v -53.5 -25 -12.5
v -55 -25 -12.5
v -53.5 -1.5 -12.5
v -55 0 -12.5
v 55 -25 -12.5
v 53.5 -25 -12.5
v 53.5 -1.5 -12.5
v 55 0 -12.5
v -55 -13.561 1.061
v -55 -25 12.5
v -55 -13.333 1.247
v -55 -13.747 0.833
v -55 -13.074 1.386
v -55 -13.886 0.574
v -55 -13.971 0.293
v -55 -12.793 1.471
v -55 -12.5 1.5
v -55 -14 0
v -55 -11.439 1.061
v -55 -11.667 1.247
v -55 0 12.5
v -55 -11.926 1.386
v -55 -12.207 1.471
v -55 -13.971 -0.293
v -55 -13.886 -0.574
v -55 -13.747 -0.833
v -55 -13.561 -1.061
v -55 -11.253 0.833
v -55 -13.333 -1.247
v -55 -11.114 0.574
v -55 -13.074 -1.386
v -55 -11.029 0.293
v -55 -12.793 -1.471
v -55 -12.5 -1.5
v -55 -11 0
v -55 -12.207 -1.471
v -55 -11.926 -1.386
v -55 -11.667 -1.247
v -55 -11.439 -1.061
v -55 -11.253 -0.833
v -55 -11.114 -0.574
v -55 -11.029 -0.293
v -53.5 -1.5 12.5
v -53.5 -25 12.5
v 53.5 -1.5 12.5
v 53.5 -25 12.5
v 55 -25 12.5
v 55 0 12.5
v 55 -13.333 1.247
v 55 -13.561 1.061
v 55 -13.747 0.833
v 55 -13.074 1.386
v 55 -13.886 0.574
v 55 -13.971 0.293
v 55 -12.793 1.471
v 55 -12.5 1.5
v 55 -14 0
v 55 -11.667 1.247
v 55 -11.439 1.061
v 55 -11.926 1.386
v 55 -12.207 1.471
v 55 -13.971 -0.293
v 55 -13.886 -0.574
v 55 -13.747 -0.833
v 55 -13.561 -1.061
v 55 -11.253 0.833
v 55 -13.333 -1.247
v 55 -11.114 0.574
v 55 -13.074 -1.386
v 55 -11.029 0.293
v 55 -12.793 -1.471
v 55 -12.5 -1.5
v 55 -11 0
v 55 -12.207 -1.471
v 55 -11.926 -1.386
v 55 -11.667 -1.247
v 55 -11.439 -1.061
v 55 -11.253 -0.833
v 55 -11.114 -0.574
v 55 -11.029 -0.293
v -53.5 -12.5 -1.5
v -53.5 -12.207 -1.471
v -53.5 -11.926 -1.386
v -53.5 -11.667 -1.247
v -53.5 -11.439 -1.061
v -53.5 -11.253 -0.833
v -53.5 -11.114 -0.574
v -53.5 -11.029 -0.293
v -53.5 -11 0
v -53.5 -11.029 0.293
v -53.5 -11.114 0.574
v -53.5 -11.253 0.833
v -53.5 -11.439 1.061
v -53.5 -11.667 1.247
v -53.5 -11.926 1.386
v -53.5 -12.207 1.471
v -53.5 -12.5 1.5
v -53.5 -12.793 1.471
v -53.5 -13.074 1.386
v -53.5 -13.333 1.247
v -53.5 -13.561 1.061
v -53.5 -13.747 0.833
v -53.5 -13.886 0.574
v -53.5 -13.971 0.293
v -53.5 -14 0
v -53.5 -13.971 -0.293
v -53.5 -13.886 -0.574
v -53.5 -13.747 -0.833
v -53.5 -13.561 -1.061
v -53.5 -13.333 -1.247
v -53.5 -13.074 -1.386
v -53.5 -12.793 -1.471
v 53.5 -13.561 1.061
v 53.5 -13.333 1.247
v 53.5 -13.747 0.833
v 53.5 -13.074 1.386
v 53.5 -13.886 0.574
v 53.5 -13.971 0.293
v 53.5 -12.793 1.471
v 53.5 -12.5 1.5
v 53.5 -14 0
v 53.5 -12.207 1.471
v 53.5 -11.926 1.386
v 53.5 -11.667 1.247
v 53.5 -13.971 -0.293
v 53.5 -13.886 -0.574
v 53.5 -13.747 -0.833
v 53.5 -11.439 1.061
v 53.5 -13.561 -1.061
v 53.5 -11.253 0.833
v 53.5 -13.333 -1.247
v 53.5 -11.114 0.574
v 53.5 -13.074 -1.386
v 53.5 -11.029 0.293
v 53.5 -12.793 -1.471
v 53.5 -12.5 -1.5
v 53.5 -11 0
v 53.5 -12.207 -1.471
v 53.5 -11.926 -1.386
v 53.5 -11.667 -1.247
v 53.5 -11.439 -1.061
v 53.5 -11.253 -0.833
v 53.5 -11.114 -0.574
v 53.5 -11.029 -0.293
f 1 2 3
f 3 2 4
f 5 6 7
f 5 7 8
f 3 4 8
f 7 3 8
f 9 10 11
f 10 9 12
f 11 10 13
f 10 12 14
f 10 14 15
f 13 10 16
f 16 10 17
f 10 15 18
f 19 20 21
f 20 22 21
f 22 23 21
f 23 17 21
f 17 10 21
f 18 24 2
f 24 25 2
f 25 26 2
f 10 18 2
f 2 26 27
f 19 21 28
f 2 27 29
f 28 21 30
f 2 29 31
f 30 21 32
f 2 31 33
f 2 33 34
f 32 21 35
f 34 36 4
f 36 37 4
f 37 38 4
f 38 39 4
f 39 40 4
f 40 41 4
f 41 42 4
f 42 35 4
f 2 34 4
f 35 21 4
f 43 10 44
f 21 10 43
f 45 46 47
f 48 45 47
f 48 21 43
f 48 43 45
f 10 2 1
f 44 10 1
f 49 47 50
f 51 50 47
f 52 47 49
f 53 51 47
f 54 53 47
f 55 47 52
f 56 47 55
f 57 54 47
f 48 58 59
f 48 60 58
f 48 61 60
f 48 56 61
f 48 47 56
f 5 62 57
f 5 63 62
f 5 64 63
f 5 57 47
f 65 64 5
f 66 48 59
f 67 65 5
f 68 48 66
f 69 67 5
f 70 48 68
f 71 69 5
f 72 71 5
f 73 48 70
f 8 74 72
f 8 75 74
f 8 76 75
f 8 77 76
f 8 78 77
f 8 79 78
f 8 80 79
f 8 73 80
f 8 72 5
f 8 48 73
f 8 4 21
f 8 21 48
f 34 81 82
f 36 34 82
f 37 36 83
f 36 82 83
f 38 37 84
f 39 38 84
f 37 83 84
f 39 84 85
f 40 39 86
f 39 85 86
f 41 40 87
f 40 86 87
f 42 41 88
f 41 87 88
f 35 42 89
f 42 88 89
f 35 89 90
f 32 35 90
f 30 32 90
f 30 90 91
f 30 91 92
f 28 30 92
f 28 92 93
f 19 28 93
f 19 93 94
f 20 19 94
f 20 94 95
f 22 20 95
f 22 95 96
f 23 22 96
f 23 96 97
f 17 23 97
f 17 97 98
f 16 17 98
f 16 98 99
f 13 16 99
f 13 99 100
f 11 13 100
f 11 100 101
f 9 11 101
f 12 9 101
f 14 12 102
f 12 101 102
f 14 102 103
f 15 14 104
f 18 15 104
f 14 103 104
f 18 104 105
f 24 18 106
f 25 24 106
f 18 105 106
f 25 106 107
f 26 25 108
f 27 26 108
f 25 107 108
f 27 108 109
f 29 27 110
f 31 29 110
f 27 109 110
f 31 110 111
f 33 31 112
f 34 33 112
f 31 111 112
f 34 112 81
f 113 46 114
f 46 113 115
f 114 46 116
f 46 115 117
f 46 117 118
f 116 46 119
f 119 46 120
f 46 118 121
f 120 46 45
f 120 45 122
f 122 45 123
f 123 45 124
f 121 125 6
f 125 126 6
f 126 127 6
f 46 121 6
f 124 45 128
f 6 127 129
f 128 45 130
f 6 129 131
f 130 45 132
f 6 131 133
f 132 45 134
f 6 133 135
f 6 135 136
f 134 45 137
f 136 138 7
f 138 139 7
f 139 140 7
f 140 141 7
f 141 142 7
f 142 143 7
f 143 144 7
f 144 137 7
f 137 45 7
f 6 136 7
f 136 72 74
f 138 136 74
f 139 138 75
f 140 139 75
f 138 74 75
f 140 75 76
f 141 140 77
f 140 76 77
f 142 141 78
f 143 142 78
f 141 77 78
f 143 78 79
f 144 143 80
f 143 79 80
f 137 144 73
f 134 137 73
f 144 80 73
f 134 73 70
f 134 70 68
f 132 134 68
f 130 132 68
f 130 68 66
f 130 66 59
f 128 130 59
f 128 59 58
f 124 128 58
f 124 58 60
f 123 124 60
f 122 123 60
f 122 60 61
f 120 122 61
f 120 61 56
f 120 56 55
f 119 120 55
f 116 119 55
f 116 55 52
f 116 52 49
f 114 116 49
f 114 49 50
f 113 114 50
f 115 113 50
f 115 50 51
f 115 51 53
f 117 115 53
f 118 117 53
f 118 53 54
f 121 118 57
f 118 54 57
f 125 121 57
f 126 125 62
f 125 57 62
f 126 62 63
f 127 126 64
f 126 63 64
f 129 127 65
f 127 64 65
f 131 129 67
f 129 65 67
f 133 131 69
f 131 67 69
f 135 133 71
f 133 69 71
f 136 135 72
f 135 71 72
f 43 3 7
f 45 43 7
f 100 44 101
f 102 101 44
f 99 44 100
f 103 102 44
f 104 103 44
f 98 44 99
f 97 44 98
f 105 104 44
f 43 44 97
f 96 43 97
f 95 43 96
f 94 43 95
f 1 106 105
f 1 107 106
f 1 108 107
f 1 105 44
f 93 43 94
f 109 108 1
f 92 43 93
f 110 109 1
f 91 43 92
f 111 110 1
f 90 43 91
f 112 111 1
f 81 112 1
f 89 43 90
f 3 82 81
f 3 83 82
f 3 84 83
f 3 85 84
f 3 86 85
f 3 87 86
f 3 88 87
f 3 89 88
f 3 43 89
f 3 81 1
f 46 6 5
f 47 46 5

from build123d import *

# Parameters (mm, degrees)
SKETCH3_W           = 107
SKETCH3_H           = 25
BOSS_EXTRUDE1_DEPTH = 1.5
SKETCH3_3_W         = 1.5
SKETCH3_3_H         = 25
BOSS_EXTRUDE2_DEPTH = 25
SKETCH4_R           = 1.5
CUT_EXTRUDE1_DEPTH  = 114.495594628


with BuildPart() as part:
    # Sketch3 → Boss-Extrude1 (new body)
    with BuildSketch(Plane(origin=(0, 0, 0), x_dir=(1, 0, 0), z_dir=(0, 1, 0))):
        Rectangle(SKETCH3_W, SKETCH3_H)
    extrude(amount=-BOSS_EXTRUDE1_DEPTH)

    # Sketch3<3> → Boss-Extrude2 (add)
    with BuildSketch(Plane(origin=(0, 0, 0), x_dir=(1, 0, 0), z_dir=(0, 1, 0))):
        with Locations((-54.25, 0)):
            Rectangle(SKETCH3_3_W, SKETCH3_3_H)
        with Locations((54.25, 0)):
            Rectangle(SKETCH3_3_W, SKETCH3_3_H)
    extrude(amount=-BOSS_EXTRUDE2_DEPTH)

    # Sketch4 → Cut-Extrude1 (cut, through all)
    with BuildSketch(Plane(origin=(55, 0, 0), x_dir=(0, 0, -1), z_dir=(1, 0, 0))):
        with Locations((0, -12.5)):
            Circle(SKETCH4_R)
    extrude(amount=-CUT_EXTRUDE1_DEPTH, mode=Mode.SUBTRACT)


solid = part.part
